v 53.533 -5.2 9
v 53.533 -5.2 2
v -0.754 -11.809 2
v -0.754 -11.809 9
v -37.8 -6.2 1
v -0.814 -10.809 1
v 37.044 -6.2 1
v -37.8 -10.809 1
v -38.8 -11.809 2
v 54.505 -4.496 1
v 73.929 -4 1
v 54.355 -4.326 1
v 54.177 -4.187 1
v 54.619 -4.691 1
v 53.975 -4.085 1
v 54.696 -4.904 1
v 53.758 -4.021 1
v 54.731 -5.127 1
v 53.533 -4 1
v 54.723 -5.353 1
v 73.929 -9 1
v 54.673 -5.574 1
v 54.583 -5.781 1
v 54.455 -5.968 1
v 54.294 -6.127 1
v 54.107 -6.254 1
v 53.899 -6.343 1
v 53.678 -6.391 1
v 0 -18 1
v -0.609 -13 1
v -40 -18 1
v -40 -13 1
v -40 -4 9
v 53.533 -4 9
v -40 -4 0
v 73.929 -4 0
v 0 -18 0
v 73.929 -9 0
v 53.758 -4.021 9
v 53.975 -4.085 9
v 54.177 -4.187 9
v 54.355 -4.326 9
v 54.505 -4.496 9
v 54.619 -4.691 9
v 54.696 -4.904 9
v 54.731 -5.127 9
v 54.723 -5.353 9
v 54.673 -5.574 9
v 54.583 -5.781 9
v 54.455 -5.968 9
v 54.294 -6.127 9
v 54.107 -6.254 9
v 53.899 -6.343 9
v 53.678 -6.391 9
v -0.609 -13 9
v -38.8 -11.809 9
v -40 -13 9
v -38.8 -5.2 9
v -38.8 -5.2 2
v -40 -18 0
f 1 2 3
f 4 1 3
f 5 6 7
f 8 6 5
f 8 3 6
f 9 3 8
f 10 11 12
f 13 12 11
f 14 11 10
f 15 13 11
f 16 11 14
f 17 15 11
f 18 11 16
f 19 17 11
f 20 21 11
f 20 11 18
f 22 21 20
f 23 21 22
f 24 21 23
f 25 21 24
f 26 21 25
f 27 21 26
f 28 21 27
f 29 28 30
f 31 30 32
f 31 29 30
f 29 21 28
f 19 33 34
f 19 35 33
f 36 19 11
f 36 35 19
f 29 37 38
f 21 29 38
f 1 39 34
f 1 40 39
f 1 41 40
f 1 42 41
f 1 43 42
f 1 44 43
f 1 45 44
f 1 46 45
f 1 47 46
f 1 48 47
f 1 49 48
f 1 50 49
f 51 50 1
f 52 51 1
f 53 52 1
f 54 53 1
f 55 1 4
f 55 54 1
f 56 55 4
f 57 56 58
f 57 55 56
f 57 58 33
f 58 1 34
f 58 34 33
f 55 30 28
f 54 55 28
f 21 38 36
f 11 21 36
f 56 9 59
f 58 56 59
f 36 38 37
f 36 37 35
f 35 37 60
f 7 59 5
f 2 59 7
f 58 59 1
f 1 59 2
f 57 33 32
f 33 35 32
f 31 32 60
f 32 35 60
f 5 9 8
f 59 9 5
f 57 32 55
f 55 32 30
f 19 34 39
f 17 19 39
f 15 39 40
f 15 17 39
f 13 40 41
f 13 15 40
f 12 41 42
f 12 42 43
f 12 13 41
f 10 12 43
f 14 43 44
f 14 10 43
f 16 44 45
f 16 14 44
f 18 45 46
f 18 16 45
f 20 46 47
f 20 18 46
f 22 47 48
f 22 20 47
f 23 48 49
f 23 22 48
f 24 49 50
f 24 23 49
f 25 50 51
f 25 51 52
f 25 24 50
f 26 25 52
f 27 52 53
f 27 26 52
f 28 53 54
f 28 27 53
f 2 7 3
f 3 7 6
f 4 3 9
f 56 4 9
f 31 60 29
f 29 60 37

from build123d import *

# Parameters (mm, degrees)
PAD_DEPTH                      = 1
PAD001_DEPTH                   = 8
CHAMFER_SIZE                   = 1
PART_MIRRORING_PLACEMENT_ANGLE = 180


with BuildPart() as body_ramp_support:
    # Sketch → Pad (new body)
    with BuildSketch(Plane.XY):
        Polygon((-40, 0), (-40, 14), (0, 14), (73.928571, 5), (73.928571, 0), align=None)
    extrude(amount=PAD_DEPTH)

    # Sketch001 (on Face7 of Pad) → Pad001 (join)
    with BuildSketch(Plane.XY.offset(1)):
        with BuildLine():
            Line((-40, 9), (-0.608696, 9))
            Line((-0.608696, 9), (53.677832, 2.391205))
            ThreePointArc((53.532815, 0), (54.730615, 1.127359), (53.677832, 2.391205))
            Line((-40, 0), (53.532815, 0))
            Line((-40, 0), (-40, 9))
        make_face()
        Polygon((53.532815, 1.2), (-0.753712, 7.808795), (-38.8, 7.808795), (-38.8, 1.2), align=None, mode=Mode.SUBTRACT)
    extrude(amount=PAD001_DEPTH)

    # Chamfer
    chamfer_edges = [body_ramp_support.edges().sort_by_distance(p)[0] for p in [
        (-19.776856, 7.808795, 1),
        (26.389552, 4.504397, 1),
        (7.366408, 1.2, 1),
        (-38.8, 4.504397, 1),
    ]]
    chamfer(chamfer_edges, length=CHAMFER_SIZE)


with BuildPart() as mirror_ramp_support:
    # Part__Mirroring: instance of Body-ramp-support
    add(body_ramp_support.part.mirror(Plane(origin=(0, 0, 0), x_dir=(0, -1, 0), z_dir=(1, 0, 0))))


with BuildPart() as mirror_ramp_support_1:
    # Part__Mirroring placement: moved
    add(mirror_ramp_support.part.moved(Location((0, -4, 0))).rotate(Axis((0, -4, 0), (0, 0, 1)), PART_MIRRORING_PLACEMENT_ANGLE))


solid = mirror_ramp_support_1.part
